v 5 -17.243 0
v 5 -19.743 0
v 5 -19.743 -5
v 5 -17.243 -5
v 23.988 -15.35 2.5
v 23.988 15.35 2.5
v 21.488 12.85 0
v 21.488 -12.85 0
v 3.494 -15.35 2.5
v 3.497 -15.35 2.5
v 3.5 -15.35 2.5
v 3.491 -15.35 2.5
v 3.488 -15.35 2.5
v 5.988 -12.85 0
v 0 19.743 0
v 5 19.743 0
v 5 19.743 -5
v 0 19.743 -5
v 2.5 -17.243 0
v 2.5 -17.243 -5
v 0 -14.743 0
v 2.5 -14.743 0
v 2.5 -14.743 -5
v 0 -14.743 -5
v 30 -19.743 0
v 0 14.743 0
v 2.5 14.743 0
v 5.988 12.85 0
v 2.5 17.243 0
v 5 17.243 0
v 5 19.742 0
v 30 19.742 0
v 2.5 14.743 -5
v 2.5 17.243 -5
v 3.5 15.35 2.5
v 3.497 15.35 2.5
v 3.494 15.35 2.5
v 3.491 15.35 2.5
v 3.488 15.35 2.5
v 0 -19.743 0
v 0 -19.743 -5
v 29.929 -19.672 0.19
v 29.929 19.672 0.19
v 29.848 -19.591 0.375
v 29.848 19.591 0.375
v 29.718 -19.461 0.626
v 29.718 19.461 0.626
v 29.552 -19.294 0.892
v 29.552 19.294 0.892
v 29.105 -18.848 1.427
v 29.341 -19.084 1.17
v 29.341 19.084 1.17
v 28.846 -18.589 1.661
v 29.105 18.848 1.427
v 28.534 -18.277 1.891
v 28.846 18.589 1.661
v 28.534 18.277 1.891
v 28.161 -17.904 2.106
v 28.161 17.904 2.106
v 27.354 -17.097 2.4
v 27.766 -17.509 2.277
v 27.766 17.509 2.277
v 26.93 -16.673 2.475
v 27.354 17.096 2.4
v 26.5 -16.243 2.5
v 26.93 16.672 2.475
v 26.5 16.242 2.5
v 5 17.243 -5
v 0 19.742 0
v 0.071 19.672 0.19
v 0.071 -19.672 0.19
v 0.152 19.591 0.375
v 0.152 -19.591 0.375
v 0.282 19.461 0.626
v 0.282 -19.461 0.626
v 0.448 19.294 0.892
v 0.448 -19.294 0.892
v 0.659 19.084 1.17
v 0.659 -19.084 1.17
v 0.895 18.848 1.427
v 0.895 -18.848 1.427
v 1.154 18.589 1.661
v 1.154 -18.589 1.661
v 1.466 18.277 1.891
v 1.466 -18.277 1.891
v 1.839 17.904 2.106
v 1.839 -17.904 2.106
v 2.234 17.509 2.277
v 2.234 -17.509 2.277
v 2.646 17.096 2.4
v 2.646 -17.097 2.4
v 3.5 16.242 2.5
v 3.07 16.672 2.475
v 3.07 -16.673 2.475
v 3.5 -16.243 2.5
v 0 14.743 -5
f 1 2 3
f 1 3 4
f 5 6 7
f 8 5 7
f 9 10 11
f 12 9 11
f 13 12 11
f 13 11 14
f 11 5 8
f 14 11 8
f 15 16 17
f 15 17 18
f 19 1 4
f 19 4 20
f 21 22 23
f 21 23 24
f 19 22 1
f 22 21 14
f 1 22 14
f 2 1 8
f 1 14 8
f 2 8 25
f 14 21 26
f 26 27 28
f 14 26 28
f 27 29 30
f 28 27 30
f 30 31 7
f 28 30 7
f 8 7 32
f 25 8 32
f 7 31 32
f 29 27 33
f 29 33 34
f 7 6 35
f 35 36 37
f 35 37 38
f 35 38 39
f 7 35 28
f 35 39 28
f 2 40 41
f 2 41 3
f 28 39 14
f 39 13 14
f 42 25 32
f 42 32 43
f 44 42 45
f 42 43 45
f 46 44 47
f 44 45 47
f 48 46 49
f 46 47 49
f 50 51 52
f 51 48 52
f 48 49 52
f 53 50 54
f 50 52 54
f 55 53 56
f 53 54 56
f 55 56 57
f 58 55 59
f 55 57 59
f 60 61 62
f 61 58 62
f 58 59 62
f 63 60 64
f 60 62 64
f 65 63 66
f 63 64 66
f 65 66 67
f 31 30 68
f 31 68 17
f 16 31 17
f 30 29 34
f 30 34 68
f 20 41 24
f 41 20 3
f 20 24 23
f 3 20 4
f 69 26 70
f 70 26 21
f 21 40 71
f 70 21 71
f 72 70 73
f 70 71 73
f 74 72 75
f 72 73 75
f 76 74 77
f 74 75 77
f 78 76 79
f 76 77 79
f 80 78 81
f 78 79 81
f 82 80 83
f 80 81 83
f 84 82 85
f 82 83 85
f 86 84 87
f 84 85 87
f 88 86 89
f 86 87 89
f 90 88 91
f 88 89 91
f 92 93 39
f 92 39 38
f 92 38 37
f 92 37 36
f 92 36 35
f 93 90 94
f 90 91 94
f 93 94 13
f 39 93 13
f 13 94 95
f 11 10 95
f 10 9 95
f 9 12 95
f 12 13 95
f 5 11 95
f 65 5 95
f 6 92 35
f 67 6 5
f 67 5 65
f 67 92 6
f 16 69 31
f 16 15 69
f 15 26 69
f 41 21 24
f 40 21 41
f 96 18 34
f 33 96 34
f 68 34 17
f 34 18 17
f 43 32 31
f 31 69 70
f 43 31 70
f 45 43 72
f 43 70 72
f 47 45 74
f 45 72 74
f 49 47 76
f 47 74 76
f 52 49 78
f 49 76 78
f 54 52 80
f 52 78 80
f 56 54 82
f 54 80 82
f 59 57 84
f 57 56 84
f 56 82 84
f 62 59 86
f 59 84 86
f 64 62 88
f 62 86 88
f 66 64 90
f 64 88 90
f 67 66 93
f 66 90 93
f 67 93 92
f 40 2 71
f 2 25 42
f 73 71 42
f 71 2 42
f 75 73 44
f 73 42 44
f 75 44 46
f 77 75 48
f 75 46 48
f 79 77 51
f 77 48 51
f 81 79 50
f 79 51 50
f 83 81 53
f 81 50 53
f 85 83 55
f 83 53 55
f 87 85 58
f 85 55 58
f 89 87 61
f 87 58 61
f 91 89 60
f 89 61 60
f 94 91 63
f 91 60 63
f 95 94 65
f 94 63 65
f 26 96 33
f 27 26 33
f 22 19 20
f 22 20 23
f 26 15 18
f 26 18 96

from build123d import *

# Parameters (mm, degrees)
SKETCH1_W           = 30
SKETCH1_H           = 39.485211854
BOSS_EXTRUDE1_DEPTH = 2.5
SKETCH2_W           = 14.50000216
SKETCH2_H           = 24.699998732
CUT_EXTRUDE1_DEPTH  = 37.000350752
CHAMFER2_SIZE       = 3
FILLET5_R           = 3.7
BOSS_EXTRUDE2_DEPTH = 5


with BuildPart() as part:
    # Sketch1 → Boss-Extrude1 (new body)
    with BuildSketch(Plane.XY):
        with Locations((15.000000036, -0.000120634)):
            Rectangle(SKETCH1_W, SKETCH1_H)
    extrude(amount=BOSS_EXTRUDE1_DEPTH)

    # Sketch2 → Cut-Extrude1 (cut, through all)
    with BuildSketch(Plane.XY.offset(2.5)):
        with Locations((13.737600789, -1.949e-06)):
            Rectangle(SKETCH2_W, SKETCH2_H)
    extrude(amount=-CUT_EXTRUDE1_DEPTH, mode=Mode.SUBTRACT)

    # Chamfer2
    # the kernel refuses this chamfer: 3 mm, written as the material it takes off along each edge
    with BuildSketch(Plane(origin=(20.987601869, -12.350001315, 2.5), x_dir=(0, -1, 0), z_dir=(-1, 0, 0)), Plane(origin=(6.487599709, 12.349997417, 2.5), x_dir=(0, 1, 0), z_dir=(1, 0, 0))) as chamfer2_piece_1:
        Polygon((CHAMFER2_SIZE, 0), (0, -CHAMFER2_SIZE), (0, 0), align=None)
    extrude(amount=14.500002159, mode=Mode.SUBTRACT)
    with BuildSketch(Plane(origin=(20.987601869, 12.349997417, 2.5), x_dir=(1, 0, 0), z_dir=(0, -1, 0)), Plane(origin=(6.487599709, -12.350001315, 2.5), x_dir=(-1, 0, 0), z_dir=(0, 1, 0))) as chamfer2_piece_2:
        Polygon((CHAMFER2_SIZE, 0), (0, -CHAMFER2_SIZE), (0, 0), align=None)
    extrude(amount=24.699998732, mode=Mode.SUBTRACT)
    with BuildSketch(Plane(origin=(20.987601869, 12.349997417, 2.5), x_dir=(1, 0, 0), z_dir=(0, -1, 0))) as chamfer2_piece_3a_section:
        Polygon((CHAMFER2_SIZE, 0), (0, -CHAMFER2_SIZE), (0, 0), align=None)
    chamfer2_piece_3a = extrude(amount=32.415047696, mode=Mode.PRIVATE)
    chamfer2_piece_3a = split(chamfer2_piece_3a, bisect_by=Plane(origin=(20.987601869, -12.350001315, 2.5), z_dir=(0, -1, 0)), keep=Keep.TOP, mode=Mode.PRIVATE)
    with BuildSketch(Plane(origin=(28.702650833, -12.350001315, 2.5), x_dir=(0, -1, 0), z_dir=(-1, 0, 0))) as chamfer2_piece_3b_section:
        Polygon((CHAMFER2_SIZE, 0), (0, -CHAMFER2_SIZE), (0, 0), align=None)
    chamfer2_piece_3b = extrude(amount=22.215051123, mode=Mode.PRIVATE)
    chamfer2_piece_3b = split(chamfer2_piece_3b, bisect_by=Plane(origin=(20.987601869, -12.350001315, 2.5), z_dir=(1, 0, 0)), keep=Keep.TOP, mode=Mode.PRIVATE)
    chamfer2_piece_3 = chamfer2_piece_3a & chamfer2_piece_3b
    add(chamfer2_piece_3, mode=Mode.SUBTRACT)
    with BuildSketch(Plane(origin=(20.987601869, -12.350001315, 2.5), x_dir=(0, -1, 0), z_dir=(-1, 0, 0))) as chamfer2_piece_4a_section:
        Polygon((CHAMFER2_SIZE, 0), (0, -CHAMFER2_SIZE), (0, 0), align=None)
    chamfer2_piece_4a = extrude(amount=22.215051123, mode=Mode.PRIVATE)
    chamfer2_piece_4a = split(chamfer2_piece_4a, bisect_by=Plane(origin=(6.487599709, -12.350001315, 2.5), z_dir=(-1, 0, 0)), keep=Keep.TOP, mode=Mode.PRIVATE)
    with BuildSketch(Plane(origin=(6.487599709, -20.065050279, 2.5), x_dir=(-1, 0, 0), z_dir=(0, 1, 0))) as chamfer2_piece_4b_section:
        Polygon((CHAMFER2_SIZE, 0), (0, -CHAMFER2_SIZE), (0, 0), align=None)
    chamfer2_piece_4b = extrude(amount=32.415047696, mode=Mode.PRIVATE)
    chamfer2_piece_4b = split(chamfer2_piece_4b, bisect_by=Plane(origin=(6.487599709, -12.350001315, 2.5), z_dir=(0, -1, 0)), keep=Keep.TOP, mode=Mode.PRIVATE)
    chamfer2_piece_4 = chamfer2_piece_4a & chamfer2_piece_4b
    add(chamfer2_piece_4, mode=Mode.SUBTRACT)
    with BuildSketch(Plane(origin=(6.487599709, 12.349997417, 2.5), x_dir=(0, 1, 0), z_dir=(1, 0, 0))) as chamfer2_piece_5a_section:
        Polygon((CHAMFER2_SIZE, 0), (0, -CHAMFER2_SIZE), (0, 0), align=None)
    chamfer2_piece_5a = extrude(amount=22.215051123, mode=Mode.PRIVATE)
    chamfer2_piece_5a = split(chamfer2_piece_5a, bisect_by=Plane(origin=(20.987601869, 12.349997417, 2.5), z_dir=(1, 0, 0)), keep=Keep.TOP, mode=Mode.PRIVATE)
    with BuildSketch(Plane(origin=(20.987601869, 20.065046381, 2.5), x_dir=(1, 0, 0), z_dir=(0, -1, 0))) as chamfer2_piece_5b_section:
        Polygon((CHAMFER2_SIZE, 0), (0, -CHAMFER2_SIZE), (0, 0), align=None)
    chamfer2_piece_5b = extrude(amount=32.415047696, mode=Mode.PRIVATE)
    chamfer2_piece_5b = split(chamfer2_piece_5b, bisect_by=Plane(origin=(20.987601869, 12.349997417, 2.5), z_dir=(0, 1, 0)), keep=Keep.TOP, mode=Mode.PRIVATE)
    chamfer2_piece_5 = chamfer2_piece_5a & chamfer2_piece_5b
    add(chamfer2_piece_5, mode=Mode.SUBTRACT)
    with BuildSketch(Plane(origin=(-1.227449254, 12.349997417, 2.5), x_dir=(0, 1, 0), z_dir=(1, 0, 0))) as chamfer2_piece_6a_section:
        Polygon((CHAMFER2_SIZE, 0), (0, -CHAMFER2_SIZE), (0, 0), align=None)
    chamfer2_piece_6a = extrude(amount=22.215051123, mode=Mode.PRIVATE)
    chamfer2_piece_6a = split(chamfer2_piece_6a, bisect_by=Plane(origin=(6.487599709, 12.349997417, 2.5), z_dir=(-1, 0, 0)), keep=Keep.TOP, mode=Mode.PRIVATE)
    with BuildSketch(Plane(origin=(6.487599709, -12.350001315, 2.5), x_dir=(-1, 0, 0), z_dir=(0, 1, 0))) as chamfer2_piece_6b_section:
        Polygon((CHAMFER2_SIZE, 0), (0, -CHAMFER2_SIZE), (0, 0), align=None)
    chamfer2_piece_6b = extrude(amount=32.415047696, mode=Mode.PRIVATE)
    chamfer2_piece_6b = split(chamfer2_piece_6b, bisect_by=Plane(origin=(6.487599709, 12.349997417, 2.5), z_dir=(0, 1, 0)), keep=Keep.TOP, mode=Mode.PRIVATE)
    chamfer2_piece_6 = chamfer2_piece_6a & chamfer2_piece_6b
    add(chamfer2_piece_6, mode=Mode.SUBTRACT)

    # Fillet5
    # the kernel refuses this fillet: 3.7 mm, written as the material it takes off along each edge
    with BuildSketch(Plane(origin=(-8.749999964, 19.742485293, 2.5), x_dir=(0, 0, -1), z_dir=(1, 0, 0))) as fillet5_piece_1:
        with BuildLine():
            CenterArc((3.7, -3.5), FILLET5_R, 108.924644416, 71.075355584)
            Line((0, -3.5), (0, 0))
            Line((0, 0), (2.5, 0))
        make_face()
    extrude(amount=47.5, mode=Mode.SUBTRACT)
    with BuildSketch(Plane(origin=(38.750000036, -19.742726561, 2.5), x_dir=(0, 1, 0), z_dir=(-1, 0, 0))) as fillet5_piece_2:
        with BuildLine():
            CenterArc((3.5, 3.7), FILLET5_R, 198.924644416, 71.075355584)
            Line((0, 2.5), (0, 0))
            Line((0, 0), (3.5, 0))
        make_face()
    extrude(amount=47.5, mode=Mode.SUBTRACT)
    with BuildSketch(Plane(origin=(3.6e-08, -28.492726561, 2.5), x_dir=(1, 0, 0), z_dir=(0, 1, 0)), Plane(origin=(30.000000036, 28.492485293, 2.5), x_dir=(-1, 0, 0), z_dir=(0, -1, 0))) as fillet5_piece_3:
        with BuildLine():
            CenterArc((3.5, 3.7), FILLET5_R, 198.924644416, 71.075355584)
            Line((0, 2.5), (0, 0))
            Line((0, 0), (3.5, 0))
        make_face()
    extrude(amount=56.985211855, mode=Mode.SUBTRACT)

    # Sketch5 → Boss-Extrude2 (add)
    with BuildSketch(Plane(origin=(0, 0, 0), x_dir=(-1, 0, 0), z_dir=(0, 0, -1))):
        Polygon((-3.6e-08, -19.742726561), (-5.000000036, -19.742726561), (-5.000000036, -17.242726561), (-2.5, -17.242726561), (-2.5, -14.742726561), (0, -14.742726561), align=None)
        Polygon((-2.499996996, 17.242720698), (-4.999997021, 17.242721136), (-4.999996584, 19.742721136), (3.416e-06, 19.742720261), (2.578e-06, 14.742720261), (-2.499997422, 14.742720698), align=None)
    extrude(amount=BOSS_EXTRUDE2_DEPTH)


solid = part.part
